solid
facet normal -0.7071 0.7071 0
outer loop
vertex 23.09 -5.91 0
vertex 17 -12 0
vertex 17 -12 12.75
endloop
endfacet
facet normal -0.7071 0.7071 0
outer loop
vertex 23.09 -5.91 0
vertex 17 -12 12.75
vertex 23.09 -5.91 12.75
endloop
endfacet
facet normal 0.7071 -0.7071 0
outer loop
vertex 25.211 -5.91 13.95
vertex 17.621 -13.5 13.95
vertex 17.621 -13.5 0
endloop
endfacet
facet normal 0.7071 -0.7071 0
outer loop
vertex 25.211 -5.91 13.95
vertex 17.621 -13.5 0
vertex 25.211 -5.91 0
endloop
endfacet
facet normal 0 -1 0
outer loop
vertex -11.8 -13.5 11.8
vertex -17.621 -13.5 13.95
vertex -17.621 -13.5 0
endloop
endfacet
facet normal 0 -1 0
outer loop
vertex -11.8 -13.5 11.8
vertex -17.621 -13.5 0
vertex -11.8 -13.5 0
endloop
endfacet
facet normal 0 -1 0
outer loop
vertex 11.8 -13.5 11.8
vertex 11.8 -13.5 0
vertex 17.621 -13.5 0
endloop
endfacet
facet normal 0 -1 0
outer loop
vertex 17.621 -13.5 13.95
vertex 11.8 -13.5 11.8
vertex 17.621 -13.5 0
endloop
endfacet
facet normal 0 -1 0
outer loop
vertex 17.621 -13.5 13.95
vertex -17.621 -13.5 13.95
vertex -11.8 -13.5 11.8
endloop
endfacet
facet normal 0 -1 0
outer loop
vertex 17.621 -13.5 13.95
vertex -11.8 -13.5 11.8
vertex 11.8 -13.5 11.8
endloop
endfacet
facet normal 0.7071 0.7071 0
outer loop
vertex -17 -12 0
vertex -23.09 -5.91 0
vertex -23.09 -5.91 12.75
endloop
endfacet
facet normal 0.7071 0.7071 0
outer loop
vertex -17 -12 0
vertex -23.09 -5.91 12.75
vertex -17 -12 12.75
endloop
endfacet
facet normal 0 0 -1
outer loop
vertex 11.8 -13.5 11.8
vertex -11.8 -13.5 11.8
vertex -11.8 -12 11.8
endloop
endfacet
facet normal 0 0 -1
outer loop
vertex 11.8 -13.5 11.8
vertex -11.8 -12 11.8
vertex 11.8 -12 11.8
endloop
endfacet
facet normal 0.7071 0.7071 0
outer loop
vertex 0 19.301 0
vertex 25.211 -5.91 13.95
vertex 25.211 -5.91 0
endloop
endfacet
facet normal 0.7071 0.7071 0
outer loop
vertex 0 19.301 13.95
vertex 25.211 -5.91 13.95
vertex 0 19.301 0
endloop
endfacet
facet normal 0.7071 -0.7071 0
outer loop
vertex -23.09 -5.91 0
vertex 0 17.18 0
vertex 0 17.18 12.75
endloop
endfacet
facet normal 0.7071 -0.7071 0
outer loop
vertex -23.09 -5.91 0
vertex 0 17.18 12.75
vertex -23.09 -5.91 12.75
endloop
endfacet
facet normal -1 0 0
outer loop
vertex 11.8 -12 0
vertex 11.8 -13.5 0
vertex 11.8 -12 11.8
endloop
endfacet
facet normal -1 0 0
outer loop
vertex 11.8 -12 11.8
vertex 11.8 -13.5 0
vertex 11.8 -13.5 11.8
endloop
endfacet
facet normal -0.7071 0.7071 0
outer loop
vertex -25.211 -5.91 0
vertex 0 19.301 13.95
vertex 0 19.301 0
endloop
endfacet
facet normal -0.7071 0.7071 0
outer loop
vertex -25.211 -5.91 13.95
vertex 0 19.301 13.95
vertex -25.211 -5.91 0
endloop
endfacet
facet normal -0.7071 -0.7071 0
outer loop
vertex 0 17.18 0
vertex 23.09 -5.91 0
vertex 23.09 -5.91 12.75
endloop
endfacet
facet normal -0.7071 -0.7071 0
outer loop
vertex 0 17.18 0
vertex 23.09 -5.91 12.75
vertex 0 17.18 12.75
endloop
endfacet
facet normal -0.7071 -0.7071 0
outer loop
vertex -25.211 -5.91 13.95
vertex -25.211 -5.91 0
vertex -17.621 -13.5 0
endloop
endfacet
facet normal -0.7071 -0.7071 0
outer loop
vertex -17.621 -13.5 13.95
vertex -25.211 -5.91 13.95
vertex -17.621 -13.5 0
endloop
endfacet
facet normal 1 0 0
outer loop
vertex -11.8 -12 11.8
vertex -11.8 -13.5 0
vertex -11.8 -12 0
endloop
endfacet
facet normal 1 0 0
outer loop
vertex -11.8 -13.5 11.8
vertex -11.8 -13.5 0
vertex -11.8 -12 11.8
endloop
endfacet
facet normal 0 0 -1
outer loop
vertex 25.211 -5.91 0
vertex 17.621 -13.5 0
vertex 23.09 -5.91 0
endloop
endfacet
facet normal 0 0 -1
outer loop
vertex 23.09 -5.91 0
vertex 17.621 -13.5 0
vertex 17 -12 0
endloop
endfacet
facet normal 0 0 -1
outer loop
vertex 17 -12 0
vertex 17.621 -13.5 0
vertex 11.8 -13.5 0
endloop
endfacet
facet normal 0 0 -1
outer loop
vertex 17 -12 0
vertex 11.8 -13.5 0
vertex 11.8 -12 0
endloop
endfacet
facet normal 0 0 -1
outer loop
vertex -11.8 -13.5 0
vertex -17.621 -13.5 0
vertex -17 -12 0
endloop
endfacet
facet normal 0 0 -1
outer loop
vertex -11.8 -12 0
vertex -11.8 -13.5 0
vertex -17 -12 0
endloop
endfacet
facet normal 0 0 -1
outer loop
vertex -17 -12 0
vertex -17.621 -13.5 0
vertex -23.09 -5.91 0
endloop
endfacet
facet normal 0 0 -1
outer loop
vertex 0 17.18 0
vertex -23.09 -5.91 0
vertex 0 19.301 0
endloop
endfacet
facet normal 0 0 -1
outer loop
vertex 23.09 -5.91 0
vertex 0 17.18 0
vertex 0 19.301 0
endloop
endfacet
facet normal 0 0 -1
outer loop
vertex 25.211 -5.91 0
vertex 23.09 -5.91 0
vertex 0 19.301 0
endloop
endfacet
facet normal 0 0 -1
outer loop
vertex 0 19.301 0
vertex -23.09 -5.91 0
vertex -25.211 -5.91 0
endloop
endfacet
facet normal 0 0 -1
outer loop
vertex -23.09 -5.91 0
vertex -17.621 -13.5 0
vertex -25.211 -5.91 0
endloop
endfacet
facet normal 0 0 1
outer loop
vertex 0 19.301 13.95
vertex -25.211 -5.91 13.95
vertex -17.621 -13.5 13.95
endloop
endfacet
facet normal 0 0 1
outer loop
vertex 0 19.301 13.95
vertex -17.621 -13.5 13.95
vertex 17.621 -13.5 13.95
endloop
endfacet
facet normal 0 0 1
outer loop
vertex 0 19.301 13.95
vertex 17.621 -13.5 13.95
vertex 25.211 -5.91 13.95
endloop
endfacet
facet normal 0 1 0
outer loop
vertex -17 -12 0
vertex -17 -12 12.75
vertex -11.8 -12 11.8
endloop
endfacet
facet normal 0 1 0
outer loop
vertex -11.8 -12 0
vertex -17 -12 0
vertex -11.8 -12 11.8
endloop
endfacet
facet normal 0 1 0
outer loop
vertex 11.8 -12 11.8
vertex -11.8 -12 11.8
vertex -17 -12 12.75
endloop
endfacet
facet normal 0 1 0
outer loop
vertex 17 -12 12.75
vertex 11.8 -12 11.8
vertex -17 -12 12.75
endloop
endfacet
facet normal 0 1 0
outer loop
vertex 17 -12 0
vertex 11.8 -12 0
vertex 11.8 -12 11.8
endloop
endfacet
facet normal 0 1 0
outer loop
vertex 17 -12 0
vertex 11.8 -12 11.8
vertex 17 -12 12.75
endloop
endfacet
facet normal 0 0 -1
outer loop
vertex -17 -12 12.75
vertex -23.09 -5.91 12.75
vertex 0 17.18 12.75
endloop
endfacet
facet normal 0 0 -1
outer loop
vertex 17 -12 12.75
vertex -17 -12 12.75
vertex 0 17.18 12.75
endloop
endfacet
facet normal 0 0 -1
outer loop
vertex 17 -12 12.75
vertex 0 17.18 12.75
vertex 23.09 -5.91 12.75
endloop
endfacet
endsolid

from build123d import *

# Parameters (mm, degrees)
EXTRUDE_1_DEPTH          = 12.75
EXTRUDE_1_DEPTH_BACK     = 12.75
EXTRUDE_1_2_DEPTH        = 1.2
EXTRUDE_2_DEPTH          = 1.2
SKETCH_4_W               = 23.6
SKETCH_4_H               = 23.6
CUT_EXTRUDE_1_DEPTH      = 1.5
CUT_EXTRUDE_2_DEPTH      = 35.680906203
CUT_EXTRUDE_2_DEPTH_BACK = 35.680906203
SKETCH_5_W               = 13.95
SKETCH_5_H               = 32.801494515


with BuildPart() as part:
    # Эскиз1 → Extrude 1 (new, two sides: drawn at the far end of the back side and taken through both)
    with BuildSketch(Plane.XY.offset(-EXTRUDE_1_DEPTH_BACK)):
        Polygon((-17.621320344, -13.5), (17.621320344, -13.5), (25.211407429, -5.909912914), (0, 19.301494515), (-25.211407429, -5.909912914), align=None)
        Polygon((-17, -12), (17, -12), (23.090087086, -5.909912914), (0, 17.180174171), (-23.090087086, -5.909912914), align=None, mode=Mode.SUBTRACT)
    extrude(amount=EXTRUDE_1_DEPTH + EXTRUDE_1_DEPTH_BACK)

    # Эскиз2 → Extrude 1 2 (add)
    with BuildSketch(Plane.XY.offset(12.75)):
        Polygon((25.211407429, -5.909912914), (0, 19.301494515), (-25.211407429, -5.909912914), (-17.621320344, -13.5), (17.621320344, -13.5), align=None)
    extrude(amount=EXTRUDE_1_2_DEPTH)

    # Эскиз3 → Бобышка-Вытянуть2 (add)
    with BuildSketch(Plane(origin=(0, 0, -12.75), x_dir=(-1, 0, 0), z_dir=(0, 0, -1))):
        Polygon((0, 19.301494515), (25.211407429, -5.909912914), (17.621320344, -13.5), (-17.621320344, -13.5), (-25.211407429, -5.909912914), align=None)
    extrude(amount=EXTRUDE_2_DEPTH)

    # Эскиз4 → Вырез-Вытянуть1 (cut)
    with BuildSketch(Plane.XZ.offset(13.5)):
        Rectangle(SKETCH_4_W, SKETCH_4_H)
    extrude(amount=-CUT_EXTRUDE_1_DEPTH, mode=Mode.SUBTRACT)

    # Эскиз5 → Вырез-Вытянуть2 (cut, two sides: drawn at the far end of the back side and taken through both)
    with BuildSketch(Plane(origin=(0, 0, 0), x_dir=(0, 0, -1), z_dir=(1, 0, 0)).offset(-CUT_EXTRUDE_2_DEPTH_BACK)):
        with Locations((6.975, 2.900747258)):
            Rectangle(SKETCH_5_W, SKETCH_5_H)
    extrude(amount=CUT_EXTRUDE_2_DEPTH + CUT_EXTRUDE_2_DEPTH_BACK, mode=Mode.SUBTRACT)


solid = part.part
